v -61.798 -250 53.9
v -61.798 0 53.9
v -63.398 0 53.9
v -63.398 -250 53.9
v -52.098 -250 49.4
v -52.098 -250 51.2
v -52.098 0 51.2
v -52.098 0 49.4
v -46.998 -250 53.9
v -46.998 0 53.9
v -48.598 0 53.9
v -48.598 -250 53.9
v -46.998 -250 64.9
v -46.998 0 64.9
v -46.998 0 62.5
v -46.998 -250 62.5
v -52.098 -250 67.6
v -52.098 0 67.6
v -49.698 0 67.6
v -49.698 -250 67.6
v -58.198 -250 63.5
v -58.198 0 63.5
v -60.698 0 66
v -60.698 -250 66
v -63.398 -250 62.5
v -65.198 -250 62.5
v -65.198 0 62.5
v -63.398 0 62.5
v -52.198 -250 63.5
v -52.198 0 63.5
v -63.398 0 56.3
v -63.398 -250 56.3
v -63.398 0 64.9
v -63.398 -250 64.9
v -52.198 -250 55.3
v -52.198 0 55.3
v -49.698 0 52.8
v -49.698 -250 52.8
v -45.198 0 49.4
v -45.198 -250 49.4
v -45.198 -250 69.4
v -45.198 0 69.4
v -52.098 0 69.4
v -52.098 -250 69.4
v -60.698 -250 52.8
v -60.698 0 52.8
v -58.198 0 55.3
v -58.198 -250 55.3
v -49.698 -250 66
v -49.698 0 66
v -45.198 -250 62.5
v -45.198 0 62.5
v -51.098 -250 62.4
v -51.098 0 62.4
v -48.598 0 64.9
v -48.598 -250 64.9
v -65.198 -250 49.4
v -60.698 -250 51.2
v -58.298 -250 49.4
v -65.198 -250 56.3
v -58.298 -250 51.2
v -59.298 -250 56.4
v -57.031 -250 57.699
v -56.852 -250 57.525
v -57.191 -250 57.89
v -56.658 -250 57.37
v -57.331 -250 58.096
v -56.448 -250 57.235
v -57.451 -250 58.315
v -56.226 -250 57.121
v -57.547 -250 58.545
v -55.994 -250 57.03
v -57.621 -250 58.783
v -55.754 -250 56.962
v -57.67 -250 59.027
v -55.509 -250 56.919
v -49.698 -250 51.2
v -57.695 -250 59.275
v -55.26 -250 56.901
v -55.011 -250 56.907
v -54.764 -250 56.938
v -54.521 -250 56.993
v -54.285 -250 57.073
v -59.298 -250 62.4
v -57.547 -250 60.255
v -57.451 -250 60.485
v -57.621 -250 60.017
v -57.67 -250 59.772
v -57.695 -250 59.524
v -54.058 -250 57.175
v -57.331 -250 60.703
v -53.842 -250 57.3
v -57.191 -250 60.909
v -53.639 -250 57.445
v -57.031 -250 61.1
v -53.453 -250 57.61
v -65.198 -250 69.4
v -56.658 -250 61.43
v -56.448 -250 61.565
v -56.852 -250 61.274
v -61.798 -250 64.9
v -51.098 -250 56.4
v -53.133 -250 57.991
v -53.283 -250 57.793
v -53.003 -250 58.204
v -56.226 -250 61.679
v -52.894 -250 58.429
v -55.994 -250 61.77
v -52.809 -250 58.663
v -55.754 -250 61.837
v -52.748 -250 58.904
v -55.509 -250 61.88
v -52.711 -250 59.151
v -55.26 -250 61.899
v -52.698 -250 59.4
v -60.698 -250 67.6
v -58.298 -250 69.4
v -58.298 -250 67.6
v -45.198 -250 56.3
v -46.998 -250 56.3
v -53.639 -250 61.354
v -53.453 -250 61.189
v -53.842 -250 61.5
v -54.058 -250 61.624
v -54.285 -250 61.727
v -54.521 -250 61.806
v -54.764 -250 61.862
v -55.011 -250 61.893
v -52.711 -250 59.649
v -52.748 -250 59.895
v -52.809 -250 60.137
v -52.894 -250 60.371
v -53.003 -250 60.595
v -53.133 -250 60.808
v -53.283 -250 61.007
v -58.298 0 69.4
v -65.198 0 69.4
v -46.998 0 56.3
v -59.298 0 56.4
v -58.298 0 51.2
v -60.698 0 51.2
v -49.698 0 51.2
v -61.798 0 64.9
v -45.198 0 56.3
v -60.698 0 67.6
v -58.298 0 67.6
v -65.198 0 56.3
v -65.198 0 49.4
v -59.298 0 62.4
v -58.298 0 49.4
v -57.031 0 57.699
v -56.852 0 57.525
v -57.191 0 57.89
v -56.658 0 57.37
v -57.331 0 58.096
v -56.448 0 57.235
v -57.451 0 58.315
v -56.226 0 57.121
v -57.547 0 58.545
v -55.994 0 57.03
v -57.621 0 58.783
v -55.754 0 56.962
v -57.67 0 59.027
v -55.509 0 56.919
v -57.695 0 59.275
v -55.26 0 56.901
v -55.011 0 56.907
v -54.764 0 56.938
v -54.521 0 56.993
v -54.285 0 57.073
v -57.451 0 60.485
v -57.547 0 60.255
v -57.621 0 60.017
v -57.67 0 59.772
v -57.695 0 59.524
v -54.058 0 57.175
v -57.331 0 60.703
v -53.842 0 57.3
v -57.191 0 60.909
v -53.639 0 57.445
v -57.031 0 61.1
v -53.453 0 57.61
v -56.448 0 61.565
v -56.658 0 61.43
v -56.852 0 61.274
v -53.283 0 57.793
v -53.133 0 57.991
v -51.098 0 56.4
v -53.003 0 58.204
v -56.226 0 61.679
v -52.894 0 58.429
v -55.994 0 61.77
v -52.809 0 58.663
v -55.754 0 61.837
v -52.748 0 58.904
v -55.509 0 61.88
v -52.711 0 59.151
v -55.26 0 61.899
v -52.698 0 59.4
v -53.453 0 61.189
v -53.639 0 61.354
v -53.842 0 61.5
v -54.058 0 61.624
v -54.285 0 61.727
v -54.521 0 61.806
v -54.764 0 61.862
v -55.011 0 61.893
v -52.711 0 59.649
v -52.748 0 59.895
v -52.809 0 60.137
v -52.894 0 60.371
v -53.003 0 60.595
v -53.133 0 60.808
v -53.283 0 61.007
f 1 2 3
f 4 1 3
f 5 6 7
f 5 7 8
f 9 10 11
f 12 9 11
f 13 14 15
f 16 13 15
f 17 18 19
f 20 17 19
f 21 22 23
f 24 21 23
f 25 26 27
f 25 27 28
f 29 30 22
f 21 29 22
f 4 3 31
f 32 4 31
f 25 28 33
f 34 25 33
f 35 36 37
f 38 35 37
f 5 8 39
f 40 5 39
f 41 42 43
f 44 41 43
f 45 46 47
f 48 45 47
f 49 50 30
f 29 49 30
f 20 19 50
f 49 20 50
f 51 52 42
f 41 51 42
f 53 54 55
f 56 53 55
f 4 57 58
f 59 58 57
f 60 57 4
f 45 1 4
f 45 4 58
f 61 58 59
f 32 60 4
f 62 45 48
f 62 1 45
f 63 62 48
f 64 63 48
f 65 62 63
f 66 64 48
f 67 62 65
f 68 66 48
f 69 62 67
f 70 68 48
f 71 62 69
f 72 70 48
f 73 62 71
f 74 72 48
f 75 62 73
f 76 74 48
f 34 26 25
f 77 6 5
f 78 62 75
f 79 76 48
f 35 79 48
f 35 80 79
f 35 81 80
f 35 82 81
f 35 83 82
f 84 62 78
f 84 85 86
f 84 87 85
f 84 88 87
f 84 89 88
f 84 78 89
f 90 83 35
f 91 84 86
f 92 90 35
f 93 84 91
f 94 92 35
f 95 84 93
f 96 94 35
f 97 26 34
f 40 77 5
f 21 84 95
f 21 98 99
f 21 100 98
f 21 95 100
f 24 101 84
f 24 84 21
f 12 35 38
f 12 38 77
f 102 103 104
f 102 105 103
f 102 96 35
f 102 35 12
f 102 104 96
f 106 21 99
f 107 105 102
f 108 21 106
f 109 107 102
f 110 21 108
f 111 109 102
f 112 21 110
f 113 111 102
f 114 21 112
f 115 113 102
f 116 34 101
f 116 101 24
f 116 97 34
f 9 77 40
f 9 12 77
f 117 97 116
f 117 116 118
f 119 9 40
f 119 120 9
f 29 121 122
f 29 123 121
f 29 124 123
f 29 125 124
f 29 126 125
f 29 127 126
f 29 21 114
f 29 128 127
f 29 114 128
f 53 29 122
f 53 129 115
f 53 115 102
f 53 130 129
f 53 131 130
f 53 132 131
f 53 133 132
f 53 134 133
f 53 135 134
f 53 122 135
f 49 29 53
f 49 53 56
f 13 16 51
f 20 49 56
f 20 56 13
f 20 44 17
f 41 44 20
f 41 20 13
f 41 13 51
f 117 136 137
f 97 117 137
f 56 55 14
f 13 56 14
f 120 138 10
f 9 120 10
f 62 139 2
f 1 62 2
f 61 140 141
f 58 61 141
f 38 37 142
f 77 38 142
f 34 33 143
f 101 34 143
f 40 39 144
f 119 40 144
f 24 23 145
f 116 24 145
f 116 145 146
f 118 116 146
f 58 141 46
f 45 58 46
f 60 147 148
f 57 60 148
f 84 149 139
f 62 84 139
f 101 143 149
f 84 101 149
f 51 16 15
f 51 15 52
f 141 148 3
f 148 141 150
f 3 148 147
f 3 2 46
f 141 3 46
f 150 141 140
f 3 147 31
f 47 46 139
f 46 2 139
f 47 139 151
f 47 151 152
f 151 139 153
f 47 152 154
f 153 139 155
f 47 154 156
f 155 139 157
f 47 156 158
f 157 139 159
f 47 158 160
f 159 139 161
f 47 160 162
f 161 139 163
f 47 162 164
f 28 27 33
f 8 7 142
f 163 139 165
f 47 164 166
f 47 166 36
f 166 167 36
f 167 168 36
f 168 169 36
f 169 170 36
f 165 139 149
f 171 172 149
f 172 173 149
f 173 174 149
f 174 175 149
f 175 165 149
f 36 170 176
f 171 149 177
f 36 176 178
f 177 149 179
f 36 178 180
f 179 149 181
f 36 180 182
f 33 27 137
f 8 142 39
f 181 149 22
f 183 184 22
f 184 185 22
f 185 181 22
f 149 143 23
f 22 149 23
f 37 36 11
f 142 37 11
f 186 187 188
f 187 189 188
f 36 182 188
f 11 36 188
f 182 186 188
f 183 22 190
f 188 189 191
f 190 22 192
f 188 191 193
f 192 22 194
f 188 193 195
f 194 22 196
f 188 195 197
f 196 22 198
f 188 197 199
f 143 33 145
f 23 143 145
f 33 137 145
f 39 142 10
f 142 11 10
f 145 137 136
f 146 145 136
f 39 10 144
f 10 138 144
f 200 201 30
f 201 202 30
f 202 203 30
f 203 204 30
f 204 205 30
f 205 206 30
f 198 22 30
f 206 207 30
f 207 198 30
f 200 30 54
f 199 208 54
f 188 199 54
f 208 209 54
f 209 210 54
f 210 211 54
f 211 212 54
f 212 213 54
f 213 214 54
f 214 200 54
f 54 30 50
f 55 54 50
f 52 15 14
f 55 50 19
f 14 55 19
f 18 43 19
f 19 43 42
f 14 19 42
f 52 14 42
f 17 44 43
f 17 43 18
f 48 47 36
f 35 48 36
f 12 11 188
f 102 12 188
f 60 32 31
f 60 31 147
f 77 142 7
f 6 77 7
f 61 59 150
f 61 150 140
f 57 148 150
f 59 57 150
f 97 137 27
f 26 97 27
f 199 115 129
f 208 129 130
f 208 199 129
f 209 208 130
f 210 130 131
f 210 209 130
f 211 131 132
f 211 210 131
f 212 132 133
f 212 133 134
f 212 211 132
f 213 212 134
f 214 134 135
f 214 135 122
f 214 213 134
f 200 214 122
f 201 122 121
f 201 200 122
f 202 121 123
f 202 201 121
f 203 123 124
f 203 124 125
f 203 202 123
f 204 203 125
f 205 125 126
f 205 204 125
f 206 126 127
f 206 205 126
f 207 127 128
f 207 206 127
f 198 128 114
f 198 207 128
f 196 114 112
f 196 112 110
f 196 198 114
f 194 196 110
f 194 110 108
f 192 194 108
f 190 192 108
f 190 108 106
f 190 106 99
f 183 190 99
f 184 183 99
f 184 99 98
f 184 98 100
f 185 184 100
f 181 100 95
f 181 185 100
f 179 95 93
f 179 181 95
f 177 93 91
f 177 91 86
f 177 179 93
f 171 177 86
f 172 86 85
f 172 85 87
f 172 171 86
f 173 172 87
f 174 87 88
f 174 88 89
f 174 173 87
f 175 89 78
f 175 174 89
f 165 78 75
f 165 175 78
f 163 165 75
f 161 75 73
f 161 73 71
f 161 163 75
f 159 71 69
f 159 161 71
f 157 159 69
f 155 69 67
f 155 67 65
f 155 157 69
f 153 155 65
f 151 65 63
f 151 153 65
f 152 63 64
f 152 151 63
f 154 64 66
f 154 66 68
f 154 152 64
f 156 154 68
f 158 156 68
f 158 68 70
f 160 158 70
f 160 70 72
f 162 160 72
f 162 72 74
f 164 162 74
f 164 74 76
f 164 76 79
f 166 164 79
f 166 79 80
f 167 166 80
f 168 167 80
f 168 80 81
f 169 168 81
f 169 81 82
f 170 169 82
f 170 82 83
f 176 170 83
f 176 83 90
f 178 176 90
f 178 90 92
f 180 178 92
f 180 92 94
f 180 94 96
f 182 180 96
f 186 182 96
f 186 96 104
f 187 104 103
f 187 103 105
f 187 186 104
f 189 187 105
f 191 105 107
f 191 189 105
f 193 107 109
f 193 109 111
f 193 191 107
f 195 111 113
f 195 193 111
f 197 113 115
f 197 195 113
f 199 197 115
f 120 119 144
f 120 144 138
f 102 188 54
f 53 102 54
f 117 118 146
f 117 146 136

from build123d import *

# Parameters (mm, degrees)
F0_R     = 2.5
F1_DEPTH = 250


with BuildPart() as f1:
    # F0 (on Front) → F1 (new body)
    with BuildSketch(Plane.XZ):
        Polygon((-58.298167, 69.399791), (-65.198167, 69.399791), (-65.198167, 62.499791), (-63.398167, 62.499791), (-63.398167, 64.899791), (-61.798167, 64.899791), (-59.298167, 62.399791), (-59.298167, 56.399791), (-61.798167, 53.899791), (-63.398167, 53.899791), (-63.398167, 56.299791), (-65.198167, 56.299791), (-65.198167, 49.399791), (-58.298167, 49.399791), (-58.298167, 51.199791), (-60.698167, 51.199791), (-60.698167, 52.799791), (-58.198167, 55.299791), (-55.198167, 55.299791), (-52.198167, 55.299791), (-49.698167, 52.799791), (-49.698167, 51.199791), (-52.098167, 51.199791), (-52.098167, 49.399791), (-45.198167, 49.399791), (-45.198167, 56.299791), (-46.998167, 56.299791), (-46.998167, 53.899791), (-48.598167, 53.899791), (-51.098167, 56.399791), (-51.098167, 62.399791), (-48.598167, 64.899791), (-46.998167, 64.899791), (-46.998167, 62.499791), (-45.198167, 62.499791), (-45.198167, 69.399791), (-52.098167, 69.399791), (-52.098167, 67.599791), (-49.698167, 67.599791), (-49.698167, 65.999791), (-52.198167, 63.499791), (-55.198167, 63.499791), (-58.198167, 63.499791), (-60.698167, 65.999791), (-60.698167, 67.599791), (-58.298167, 67.599791), align=None)
        with Locations((-55.198167, 59.399791)):
            Circle(F0_R, mode=Mode.SUBTRACT)
    extrude(amount=F1_DEPTH)


solid = f1.part
